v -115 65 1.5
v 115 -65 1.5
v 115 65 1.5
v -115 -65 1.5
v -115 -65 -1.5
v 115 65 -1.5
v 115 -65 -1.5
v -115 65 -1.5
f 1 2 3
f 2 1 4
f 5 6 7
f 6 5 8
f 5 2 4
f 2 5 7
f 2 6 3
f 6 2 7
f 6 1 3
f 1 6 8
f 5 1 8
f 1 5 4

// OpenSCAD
// ========================================
// a 230 x 130 x 3 mm plate
// NeuroCAD canonical IR; dimensions are millimetres
// ========================================
$fn = 48;

cube(size=[230, 130, 3], center=true);
